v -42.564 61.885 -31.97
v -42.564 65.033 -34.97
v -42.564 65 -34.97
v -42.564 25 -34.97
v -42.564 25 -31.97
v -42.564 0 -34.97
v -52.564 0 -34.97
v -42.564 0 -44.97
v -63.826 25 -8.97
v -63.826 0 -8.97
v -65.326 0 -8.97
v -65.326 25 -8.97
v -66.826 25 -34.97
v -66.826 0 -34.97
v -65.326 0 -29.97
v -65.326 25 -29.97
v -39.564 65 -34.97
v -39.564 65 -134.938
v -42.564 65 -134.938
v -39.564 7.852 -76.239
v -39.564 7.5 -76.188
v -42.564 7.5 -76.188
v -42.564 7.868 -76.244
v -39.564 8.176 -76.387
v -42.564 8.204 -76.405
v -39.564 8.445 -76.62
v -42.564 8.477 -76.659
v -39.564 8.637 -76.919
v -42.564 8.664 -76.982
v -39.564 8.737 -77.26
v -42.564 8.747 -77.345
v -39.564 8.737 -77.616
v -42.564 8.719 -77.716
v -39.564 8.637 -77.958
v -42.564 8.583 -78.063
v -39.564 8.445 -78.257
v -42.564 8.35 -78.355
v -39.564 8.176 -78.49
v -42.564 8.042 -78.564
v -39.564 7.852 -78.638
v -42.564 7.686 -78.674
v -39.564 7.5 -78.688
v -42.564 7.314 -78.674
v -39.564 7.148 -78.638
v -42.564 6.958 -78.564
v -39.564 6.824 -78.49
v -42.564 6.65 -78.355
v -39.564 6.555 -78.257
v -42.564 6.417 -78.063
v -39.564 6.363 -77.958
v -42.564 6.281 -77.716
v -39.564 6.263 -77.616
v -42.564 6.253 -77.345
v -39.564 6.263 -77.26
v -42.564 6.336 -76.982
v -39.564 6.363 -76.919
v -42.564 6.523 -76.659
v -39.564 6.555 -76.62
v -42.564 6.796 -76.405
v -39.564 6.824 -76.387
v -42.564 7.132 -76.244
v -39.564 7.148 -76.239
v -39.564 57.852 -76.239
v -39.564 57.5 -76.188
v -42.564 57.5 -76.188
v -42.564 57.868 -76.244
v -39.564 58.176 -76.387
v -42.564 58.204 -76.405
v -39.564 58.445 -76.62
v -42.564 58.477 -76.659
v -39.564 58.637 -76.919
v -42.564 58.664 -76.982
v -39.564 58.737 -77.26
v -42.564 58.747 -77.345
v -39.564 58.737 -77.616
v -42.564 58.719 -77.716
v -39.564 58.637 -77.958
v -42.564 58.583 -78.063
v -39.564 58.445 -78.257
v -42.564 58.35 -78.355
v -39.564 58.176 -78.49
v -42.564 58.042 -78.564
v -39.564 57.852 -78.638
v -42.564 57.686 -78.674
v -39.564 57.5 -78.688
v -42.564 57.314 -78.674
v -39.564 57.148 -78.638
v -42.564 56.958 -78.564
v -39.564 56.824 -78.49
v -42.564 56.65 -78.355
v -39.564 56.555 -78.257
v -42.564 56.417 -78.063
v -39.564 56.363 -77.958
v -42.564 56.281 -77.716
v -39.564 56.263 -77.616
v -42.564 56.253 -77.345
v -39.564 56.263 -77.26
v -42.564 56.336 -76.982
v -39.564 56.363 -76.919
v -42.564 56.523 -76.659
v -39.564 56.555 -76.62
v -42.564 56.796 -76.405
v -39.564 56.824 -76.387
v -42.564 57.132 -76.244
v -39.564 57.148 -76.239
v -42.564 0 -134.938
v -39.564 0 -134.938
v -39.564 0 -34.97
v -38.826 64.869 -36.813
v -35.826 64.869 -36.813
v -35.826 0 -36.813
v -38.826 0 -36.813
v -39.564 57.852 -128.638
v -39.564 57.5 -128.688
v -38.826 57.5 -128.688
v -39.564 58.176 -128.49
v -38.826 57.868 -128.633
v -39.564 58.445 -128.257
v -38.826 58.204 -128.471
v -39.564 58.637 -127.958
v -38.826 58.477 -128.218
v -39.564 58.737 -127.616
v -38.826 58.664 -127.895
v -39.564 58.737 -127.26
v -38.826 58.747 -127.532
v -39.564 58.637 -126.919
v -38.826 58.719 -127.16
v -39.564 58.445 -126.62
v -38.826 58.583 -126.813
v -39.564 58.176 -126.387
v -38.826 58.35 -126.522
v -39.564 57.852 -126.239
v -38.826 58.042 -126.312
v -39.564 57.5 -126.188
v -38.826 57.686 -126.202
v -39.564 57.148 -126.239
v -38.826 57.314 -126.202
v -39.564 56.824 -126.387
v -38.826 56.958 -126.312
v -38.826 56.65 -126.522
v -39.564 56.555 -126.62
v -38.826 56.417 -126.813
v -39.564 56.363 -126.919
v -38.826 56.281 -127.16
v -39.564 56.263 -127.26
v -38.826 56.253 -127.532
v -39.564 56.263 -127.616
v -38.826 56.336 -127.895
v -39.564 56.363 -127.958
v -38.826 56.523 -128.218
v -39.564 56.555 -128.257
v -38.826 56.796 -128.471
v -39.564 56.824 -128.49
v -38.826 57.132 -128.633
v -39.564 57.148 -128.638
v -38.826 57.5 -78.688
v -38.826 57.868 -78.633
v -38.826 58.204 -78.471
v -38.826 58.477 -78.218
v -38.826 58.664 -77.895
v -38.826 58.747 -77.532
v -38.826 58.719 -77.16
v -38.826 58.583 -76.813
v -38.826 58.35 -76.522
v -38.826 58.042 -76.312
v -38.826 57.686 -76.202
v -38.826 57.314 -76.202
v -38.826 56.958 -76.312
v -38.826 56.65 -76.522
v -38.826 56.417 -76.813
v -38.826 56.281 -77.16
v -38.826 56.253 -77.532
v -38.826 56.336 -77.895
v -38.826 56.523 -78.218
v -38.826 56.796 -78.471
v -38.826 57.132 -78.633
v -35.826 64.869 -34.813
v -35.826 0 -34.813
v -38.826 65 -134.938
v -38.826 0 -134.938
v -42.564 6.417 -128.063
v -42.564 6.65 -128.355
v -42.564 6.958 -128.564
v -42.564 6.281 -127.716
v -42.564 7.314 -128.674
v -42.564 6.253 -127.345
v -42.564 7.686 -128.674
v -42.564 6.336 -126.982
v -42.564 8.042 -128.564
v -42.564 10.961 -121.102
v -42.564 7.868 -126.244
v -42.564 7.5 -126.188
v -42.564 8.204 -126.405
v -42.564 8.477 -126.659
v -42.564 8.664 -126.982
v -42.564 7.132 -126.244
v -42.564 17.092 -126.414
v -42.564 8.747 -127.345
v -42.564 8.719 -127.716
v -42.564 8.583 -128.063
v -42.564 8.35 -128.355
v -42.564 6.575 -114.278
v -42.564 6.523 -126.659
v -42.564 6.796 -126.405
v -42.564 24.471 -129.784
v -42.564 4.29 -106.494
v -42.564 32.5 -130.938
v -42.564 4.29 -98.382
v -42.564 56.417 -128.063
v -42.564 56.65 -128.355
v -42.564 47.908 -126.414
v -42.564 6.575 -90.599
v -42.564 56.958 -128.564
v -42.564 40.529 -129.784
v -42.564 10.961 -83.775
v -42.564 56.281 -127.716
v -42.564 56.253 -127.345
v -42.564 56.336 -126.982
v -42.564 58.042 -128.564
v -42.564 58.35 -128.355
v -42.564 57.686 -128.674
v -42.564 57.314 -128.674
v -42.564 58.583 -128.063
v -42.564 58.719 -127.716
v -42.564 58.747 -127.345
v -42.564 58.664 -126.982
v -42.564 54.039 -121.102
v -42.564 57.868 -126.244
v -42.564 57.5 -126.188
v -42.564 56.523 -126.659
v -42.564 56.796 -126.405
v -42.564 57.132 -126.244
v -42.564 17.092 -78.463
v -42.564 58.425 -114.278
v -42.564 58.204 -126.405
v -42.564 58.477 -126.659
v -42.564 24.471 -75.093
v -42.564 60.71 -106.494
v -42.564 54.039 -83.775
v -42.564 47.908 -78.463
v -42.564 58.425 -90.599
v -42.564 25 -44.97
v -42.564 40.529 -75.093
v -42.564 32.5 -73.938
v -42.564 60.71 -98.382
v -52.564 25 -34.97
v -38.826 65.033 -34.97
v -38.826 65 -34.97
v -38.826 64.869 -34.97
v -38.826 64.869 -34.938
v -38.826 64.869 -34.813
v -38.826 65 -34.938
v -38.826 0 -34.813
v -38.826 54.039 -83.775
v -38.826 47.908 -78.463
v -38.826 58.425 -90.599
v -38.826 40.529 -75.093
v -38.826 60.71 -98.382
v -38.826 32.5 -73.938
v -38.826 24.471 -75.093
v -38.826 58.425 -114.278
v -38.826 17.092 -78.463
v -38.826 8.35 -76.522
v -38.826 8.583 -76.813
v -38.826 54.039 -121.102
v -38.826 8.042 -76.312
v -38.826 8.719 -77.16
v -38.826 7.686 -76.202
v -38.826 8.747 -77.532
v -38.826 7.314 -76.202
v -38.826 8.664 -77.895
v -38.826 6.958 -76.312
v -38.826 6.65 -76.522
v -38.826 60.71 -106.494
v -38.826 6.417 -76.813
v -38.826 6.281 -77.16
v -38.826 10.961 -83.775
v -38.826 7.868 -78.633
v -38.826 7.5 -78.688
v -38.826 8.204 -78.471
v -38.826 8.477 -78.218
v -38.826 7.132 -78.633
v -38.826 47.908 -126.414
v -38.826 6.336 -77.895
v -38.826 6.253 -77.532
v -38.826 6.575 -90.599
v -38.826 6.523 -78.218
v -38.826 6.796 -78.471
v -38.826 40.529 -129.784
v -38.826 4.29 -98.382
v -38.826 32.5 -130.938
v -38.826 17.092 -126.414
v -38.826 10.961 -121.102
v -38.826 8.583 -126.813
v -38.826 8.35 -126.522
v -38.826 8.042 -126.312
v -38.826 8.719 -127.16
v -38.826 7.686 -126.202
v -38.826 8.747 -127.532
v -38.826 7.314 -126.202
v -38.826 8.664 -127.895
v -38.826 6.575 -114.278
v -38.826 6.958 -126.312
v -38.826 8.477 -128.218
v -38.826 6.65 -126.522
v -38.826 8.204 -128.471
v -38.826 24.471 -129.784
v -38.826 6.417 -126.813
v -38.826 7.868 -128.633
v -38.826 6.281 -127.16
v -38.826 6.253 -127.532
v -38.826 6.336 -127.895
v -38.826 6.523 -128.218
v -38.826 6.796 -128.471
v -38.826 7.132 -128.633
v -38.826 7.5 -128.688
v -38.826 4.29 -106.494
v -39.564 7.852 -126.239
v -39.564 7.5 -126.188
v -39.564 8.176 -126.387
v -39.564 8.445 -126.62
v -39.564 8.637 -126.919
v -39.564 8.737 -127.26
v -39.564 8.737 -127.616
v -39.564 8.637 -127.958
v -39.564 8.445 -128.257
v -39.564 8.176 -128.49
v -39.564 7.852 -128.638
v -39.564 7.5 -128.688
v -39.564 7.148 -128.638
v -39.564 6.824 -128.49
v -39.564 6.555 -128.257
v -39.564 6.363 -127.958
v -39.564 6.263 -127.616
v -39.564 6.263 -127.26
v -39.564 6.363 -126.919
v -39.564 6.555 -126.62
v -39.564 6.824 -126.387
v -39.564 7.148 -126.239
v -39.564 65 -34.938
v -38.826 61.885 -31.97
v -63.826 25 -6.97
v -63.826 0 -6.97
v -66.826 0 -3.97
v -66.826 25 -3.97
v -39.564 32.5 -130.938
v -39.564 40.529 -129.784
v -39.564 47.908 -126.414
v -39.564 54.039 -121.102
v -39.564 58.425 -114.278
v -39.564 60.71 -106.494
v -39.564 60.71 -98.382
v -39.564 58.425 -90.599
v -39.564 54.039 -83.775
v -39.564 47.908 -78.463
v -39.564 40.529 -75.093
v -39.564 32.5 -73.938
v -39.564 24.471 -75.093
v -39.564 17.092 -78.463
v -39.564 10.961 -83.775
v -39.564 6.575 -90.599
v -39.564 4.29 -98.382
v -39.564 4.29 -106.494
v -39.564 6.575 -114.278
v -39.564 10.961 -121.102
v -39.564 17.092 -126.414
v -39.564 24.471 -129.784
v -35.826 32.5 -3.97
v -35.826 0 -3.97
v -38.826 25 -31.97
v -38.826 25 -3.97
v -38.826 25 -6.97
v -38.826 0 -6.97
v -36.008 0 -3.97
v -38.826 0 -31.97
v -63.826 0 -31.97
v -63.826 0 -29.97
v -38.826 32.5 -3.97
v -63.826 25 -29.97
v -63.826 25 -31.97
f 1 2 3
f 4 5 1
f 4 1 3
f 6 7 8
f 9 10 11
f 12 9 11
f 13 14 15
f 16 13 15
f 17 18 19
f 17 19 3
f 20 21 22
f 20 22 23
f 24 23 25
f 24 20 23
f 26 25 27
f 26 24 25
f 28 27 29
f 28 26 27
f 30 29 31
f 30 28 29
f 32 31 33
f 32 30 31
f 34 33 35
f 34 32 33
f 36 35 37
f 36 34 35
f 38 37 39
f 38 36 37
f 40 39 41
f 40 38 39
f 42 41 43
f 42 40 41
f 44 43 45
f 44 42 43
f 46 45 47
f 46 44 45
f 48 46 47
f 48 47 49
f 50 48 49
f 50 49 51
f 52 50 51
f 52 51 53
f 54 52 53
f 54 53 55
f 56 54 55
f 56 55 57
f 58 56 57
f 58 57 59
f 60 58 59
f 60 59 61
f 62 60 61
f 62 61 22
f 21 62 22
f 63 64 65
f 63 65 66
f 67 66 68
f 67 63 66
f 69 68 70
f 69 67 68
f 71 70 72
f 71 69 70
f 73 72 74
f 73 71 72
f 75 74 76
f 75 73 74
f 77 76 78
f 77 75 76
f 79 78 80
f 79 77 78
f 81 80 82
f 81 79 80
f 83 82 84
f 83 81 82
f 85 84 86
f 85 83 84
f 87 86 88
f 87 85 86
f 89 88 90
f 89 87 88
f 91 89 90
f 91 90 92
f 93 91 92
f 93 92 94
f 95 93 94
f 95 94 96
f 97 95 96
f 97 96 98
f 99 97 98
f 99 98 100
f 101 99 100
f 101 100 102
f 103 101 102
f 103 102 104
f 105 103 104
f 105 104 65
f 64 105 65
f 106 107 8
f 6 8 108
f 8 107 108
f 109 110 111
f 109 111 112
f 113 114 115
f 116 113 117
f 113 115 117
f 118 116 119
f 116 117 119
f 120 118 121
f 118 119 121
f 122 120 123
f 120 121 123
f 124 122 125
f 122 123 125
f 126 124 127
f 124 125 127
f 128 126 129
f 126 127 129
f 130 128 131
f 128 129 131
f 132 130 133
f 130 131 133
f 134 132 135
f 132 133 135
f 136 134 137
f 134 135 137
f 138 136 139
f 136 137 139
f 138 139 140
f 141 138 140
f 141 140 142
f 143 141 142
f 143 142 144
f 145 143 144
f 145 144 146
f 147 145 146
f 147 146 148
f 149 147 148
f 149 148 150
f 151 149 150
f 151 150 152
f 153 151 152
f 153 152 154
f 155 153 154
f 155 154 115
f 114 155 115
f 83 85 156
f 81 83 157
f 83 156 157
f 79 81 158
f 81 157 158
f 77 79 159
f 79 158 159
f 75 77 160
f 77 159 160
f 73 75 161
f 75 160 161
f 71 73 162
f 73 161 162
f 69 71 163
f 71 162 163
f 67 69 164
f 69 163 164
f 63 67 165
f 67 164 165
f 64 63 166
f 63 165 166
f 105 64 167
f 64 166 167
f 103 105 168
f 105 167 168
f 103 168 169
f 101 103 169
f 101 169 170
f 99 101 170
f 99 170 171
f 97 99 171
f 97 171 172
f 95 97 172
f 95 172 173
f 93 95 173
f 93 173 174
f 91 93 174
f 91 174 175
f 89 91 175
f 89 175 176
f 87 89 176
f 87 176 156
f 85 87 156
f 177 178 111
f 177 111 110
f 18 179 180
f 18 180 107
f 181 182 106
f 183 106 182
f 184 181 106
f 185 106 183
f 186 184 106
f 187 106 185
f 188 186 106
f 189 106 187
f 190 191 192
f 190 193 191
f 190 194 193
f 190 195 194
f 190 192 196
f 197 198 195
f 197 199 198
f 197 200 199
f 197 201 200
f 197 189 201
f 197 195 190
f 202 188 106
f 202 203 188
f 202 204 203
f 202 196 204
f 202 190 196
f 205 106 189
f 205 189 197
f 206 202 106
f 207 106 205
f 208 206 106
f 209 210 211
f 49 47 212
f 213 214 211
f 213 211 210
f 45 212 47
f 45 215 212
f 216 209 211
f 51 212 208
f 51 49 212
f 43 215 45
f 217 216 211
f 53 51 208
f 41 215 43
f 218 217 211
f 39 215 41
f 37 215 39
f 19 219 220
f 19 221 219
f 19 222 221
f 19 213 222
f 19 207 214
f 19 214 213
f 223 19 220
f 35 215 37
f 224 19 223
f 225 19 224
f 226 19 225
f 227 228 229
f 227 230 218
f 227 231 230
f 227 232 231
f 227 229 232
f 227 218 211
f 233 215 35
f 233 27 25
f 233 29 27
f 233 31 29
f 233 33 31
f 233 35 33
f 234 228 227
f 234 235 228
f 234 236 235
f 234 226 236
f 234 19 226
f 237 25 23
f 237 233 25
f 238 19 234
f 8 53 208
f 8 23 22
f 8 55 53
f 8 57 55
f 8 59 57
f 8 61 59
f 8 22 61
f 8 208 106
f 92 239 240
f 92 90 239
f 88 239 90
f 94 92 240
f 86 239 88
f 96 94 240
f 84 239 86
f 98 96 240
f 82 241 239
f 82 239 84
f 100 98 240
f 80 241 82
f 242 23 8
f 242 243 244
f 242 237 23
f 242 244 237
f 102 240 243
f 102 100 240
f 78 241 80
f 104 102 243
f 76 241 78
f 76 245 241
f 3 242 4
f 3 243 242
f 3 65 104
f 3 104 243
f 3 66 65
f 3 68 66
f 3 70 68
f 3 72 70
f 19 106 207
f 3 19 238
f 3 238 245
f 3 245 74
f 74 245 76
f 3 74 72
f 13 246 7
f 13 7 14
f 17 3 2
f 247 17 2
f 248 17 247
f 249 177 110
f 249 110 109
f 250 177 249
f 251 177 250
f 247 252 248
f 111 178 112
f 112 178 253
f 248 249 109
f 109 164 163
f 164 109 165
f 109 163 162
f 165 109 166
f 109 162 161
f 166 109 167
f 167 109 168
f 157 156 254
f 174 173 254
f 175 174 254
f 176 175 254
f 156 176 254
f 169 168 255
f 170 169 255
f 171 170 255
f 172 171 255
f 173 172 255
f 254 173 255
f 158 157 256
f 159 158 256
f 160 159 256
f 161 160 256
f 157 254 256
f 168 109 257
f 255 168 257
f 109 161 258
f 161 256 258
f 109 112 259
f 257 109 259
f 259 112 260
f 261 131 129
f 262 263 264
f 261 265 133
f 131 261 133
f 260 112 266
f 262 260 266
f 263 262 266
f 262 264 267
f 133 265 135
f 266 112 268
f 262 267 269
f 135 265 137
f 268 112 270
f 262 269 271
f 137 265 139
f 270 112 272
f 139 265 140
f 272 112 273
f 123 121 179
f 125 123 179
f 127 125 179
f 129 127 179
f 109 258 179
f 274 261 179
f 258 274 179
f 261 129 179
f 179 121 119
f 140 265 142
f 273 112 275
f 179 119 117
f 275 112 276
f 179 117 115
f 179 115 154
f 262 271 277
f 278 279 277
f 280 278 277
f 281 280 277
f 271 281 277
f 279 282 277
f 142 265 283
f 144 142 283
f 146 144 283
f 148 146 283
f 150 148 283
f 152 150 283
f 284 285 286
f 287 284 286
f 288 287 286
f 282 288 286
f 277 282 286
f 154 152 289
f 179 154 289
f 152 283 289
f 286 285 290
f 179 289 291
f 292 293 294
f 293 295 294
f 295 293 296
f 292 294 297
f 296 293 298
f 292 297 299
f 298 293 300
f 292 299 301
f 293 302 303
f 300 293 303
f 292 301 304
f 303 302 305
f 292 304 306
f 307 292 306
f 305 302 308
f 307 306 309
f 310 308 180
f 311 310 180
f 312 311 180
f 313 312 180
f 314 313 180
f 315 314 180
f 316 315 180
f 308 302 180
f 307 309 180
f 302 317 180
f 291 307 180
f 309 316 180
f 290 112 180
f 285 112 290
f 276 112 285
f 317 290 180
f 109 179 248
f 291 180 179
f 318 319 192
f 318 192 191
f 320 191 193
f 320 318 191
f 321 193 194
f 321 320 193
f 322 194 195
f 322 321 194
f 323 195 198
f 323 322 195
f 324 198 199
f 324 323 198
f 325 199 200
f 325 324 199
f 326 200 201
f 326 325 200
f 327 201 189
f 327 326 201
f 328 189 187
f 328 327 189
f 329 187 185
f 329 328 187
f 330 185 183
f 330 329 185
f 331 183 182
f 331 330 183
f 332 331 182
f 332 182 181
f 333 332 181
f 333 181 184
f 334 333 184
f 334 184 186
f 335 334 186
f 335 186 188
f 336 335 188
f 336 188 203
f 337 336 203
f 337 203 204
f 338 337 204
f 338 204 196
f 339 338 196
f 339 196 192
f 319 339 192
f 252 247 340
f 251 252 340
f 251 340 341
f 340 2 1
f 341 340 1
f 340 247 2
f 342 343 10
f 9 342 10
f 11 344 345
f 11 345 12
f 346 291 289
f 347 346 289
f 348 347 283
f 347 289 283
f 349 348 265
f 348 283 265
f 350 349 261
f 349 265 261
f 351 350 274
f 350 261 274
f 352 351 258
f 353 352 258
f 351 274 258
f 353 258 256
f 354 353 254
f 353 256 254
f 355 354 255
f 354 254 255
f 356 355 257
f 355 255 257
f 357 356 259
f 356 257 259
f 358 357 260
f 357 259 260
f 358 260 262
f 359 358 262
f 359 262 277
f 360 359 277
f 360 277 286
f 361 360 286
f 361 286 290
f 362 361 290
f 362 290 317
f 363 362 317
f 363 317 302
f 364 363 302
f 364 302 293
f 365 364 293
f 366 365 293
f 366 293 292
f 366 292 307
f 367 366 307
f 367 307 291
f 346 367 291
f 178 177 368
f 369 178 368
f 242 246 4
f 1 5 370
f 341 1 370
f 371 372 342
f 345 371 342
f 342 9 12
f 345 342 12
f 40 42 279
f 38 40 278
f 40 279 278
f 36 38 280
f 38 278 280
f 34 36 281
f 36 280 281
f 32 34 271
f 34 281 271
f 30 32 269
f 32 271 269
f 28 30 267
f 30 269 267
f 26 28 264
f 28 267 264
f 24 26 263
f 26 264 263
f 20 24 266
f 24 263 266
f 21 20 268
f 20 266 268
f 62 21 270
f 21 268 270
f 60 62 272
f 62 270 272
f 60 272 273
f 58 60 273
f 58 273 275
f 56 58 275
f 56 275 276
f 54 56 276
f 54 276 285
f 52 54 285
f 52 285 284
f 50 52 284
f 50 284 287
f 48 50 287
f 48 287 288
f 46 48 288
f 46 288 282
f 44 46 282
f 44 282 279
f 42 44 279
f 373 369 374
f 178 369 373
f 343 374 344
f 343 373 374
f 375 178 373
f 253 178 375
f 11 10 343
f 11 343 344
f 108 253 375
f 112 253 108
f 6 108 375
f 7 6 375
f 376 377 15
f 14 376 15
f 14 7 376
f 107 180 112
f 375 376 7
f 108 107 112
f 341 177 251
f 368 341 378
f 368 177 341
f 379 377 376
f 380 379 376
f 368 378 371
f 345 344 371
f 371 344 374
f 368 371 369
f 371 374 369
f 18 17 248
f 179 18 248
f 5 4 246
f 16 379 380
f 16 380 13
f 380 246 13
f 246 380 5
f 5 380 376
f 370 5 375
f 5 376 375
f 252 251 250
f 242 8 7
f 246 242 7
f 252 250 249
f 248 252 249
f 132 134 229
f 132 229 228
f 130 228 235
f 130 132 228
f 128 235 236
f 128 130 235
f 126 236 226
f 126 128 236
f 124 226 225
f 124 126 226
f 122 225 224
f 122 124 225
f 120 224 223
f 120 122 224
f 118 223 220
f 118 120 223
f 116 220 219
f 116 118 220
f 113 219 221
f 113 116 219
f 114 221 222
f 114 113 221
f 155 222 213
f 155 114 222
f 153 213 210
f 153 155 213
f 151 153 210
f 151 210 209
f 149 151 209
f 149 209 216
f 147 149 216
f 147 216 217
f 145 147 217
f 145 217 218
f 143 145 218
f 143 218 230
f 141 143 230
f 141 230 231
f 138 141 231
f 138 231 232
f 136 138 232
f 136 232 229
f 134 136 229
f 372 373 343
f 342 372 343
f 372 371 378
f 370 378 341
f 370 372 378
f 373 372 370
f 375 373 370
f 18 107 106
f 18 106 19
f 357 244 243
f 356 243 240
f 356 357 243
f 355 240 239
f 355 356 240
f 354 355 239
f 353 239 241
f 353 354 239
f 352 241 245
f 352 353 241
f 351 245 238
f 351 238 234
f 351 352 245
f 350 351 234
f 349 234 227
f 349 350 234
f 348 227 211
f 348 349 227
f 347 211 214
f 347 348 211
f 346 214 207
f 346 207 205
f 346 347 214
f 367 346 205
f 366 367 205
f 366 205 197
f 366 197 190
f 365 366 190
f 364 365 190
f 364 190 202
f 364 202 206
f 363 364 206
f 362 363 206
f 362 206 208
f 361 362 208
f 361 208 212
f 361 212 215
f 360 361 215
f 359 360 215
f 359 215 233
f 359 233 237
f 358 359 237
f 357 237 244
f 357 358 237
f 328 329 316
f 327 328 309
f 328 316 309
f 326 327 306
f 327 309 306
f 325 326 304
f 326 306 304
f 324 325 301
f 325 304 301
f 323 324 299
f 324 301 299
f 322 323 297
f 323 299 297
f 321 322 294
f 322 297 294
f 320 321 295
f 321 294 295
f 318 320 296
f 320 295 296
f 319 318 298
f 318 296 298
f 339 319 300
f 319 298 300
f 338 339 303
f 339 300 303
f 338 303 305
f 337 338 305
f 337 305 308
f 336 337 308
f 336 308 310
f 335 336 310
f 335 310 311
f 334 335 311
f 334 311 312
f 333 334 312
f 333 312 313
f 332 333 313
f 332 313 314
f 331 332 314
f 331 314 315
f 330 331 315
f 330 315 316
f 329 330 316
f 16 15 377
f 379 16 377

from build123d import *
from build123d.topology import SkipClean

# Parameters (mm, degrees)
EXTRUDE_1_DEPTH      = 25
CUT_EXTRUDE_4_DEPTH  = 80.457942189
SKETCH_7_W           = 16.60831278
SKETCH_7_H           = 38.473598513
CUT_EXTRUDE_14_DEPTH = 80.457942189
SKETCH_8_W           = 5
SKETCH_8_H           = 30.968526609
EXTRUDE_2_DEPTH      = 25
SKETCH_9_W           = 2.765387297
SKETCH_9_H           = 65
EXTRUDE_3_DEPTH      = 100
SKETCH_10_W          = 5.026813651
SKETCH_10_H          = 30.968526609
EXTRUDE_4_DEPTH      = 40
CUT_EXTRUDE_15_DEPTH = 100
SKETCH_12_R          = 28.5
CUT_EXTRUDE_16_DEPTH = 100
SKETCH_13_R          = 1.25
CUT_EXTRUDE_17_DEPTH = 100
SKETCH_14_W          = 5.026813651
SKETCH_14_H          = 100.124810737
CUT_EXTRUDE_19_DEPTH = 165.009199789
SKETCH_15_W          = 2.026813651
SKETCH_15_H          = 30.843715872
CUT_EXTRUDE_20_DEPTH = 165.009199789
SKETCH_16_W          = 99.968526609
SKETCH_16_H          = 65
SKETCH_16_R          = 28.5
SKETCH_16_R_2        = 1.25
EXTRUDE_5_DEPTH      = 3
EXTRUDE_7_REACH      = 157.801
SKETCH_17_W          = 3.738573646
SKETCH_17_H          = 3
CHAMFER_1_DEPTH      = 25
SKETCH_18_W          = 3
SKETCH_18_H          = 64.869017051
EXTRUDE_8_DEPTH      = 2


with BuildPart() as part:
    # Эскиз1 → Бобышка-Вытянуть1 (new body)
    with BuildSketch(Plane(origin=(0, 0, 0), x_dir=(1, 0, 0), z_dir=(0, 1, 0))):
        Polygon((-66.825757576, 34.969739794), (-66.825757576, 29.969739794), (-63.825757576, 29.969739794), (-63.825757576, 31.969739794), (-38.825757576, 31.969739794), (-38.825757576, 6.969739794), (-63.825757576, 6.969739794), (-63.825757576, 8.969739794), (-66.825757576, 8.969739794), (-66.825757576, 3.969739794), (-22.123470102, 3.969739794), (-36.579007505, 34.969739794), align=None)
    extrude(amount=EXTRUDE_1_DEPTH)

    # Эскиз3 → Вырез-Вытянуть4 (cut, through all)
    with BuildSketch(Plane.XZ):
        Polygon((-66.825757576, -3.969739794), (-65.325757576, -8.969739794), (-66.825757576, -8.969739794), align=None)
        Polygon((-66.825757576, -29.969739794), (-66.825757576, -34.969739794), (-65.325757576, -29.969739794), align=None)
    extrude(amount=-CUT_EXTRUDE_4_DEPTH, mode=Mode.SUBTRACT)

    # Эскиз7 → Вырез-Вытянуть14 (cut, through all)
    with BuildSketch(Plane(origin=(0, 0, 0), x_dir=(-1, 0, 0), z_dir=(0, -1, 0))):
        with Locations((27.703474463, 20.539743139)):
            Rectangle(SKETCH_7_W, SKETCH_7_H)
    extrude(amount=-CUT_EXTRUDE_14_DEPTH, mode=Mode.SUBTRACT)

    # Эскиз8 → Бобышка-Вытянуть2 (add)
    with BuildSketch(Plane(origin=(0, 0, 0), x_dir=(-1, 0, 0), z_dir=(0, -1, 0))):
        with Locations((36.298943925, 19.454003098)):
            Rectangle(SKETCH_8_W, SKETCH_8_H)
    extrude(amount=-EXTRUDE_2_DEPTH)

    # Эскиз9 → Бобышка-Вытянуть3 (add)
    with BuildSketch(Plane(origin=(0, 0, -34.938266403), x_dir=(-1, 0, 0), z_dir=(0, 0, -1))):
        with Locations((38.181637573, 32.5)):
            Rectangle(SKETCH_9_W, SKETCH_9_H)
    extrude(amount=EXTRUDE_3_DEPTH)

    # Эскиз10 → Бобышка-Вытянуть4 (add)
    with BuildSketch(Plane(origin=(0, 25, 0), x_dir=(1, 0, 0), z_dir=(0, 1, 0))):
        with Locations((-36.312350751, 19.454003098)):
            Rectangle(SKETCH_10_W, SKETCH_10_H)
    extrude(amount=EXTRUDE_4_DEPTH)

    # Эскиз11 → Вырез-Вытянуть15 (cut)
    with BuildSketch(Plane(origin=(-33.798943925, 0, 0), x_dir=(0, 0, -1), z_dir=(1, 0, 0))):
        Polygon((34.938266403, 65), (3.969739794, 32.5), (3.969739794, 65), align=None)
    extrude(amount=-CUT_EXTRUDE_15_DEPTH, mode=Mode.SUBTRACT)

    # Эскиз12 → Вырез-Вытянуть16 (cut)
    with BuildSketch(Plane(origin=(-36.798943925, 0, 0), x_dir=(0, 0, -1), z_dir=(1, 0, 0))):
        with Locations((102.438266403, 32.5)):
            Circle(SKETCH_12_R)
    extrude(amount=-CUT_EXTRUDE_16_DEPTH, mode=Mode.SUBTRACT)

    # Эскиз13 → Вырез-Вытянуть17 (cut)
    with BuildSketch(Plane(origin=(-36.798943925, 0, 0), x_dir=(0, 0, -1), z_dir=(1, 0, 0))):
        with Locations((77.438266403, 57.5)):
            Circle(SKETCH_13_R)
        with Locations((127.438266403, 57.5)):
            Circle(SKETCH_13_R)
        with Locations((127.438266403, 7.5)):
            Circle(SKETCH_13_R)
        with Locations((77.438266403, 7.5)):
            Circle(SKETCH_13_R)
    extrude(amount=-CUT_EXTRUDE_17_DEPTH, mode=Mode.SUBTRACT)

    # Эскиз14 → Вырез-Вытянуть19 (cut, through all)
    with BuildSketch(Plane(origin=(0, 0, 0), x_dir=(-1, 0, 0), z_dir=(0, -1, 0))):
        with Locations((36.312350751, 84.875861035)):
            Rectangle(SKETCH_14_W, SKETCH_14_H)
    extrude(amount=-CUT_EXTRUDE_19_DEPTH, mode=Mode.SUBTRACT)

    # Эскиз15 → Вырез-Вытянуть20 (cut, through all)
    with BuildSketch(Plane.XZ):
        with Locations((-34.812350751, -19.39159773)):
            Rectangle(SKETCH_15_W, SKETCH_15_H)
    extrude(amount=-CUT_EXTRUDE_20_DEPTH, mode=Mode.SUBTRACT)

    # Эскиз16 → Бобышка-Вытянуть5 (add)
    with SkipClean():  # the faces are left unmerged after this step: merging them gives an invalid solid
        with BuildSketch(Plane.ZY.offset(39.564331222)):
            with Locations((-84.954003098, 32.5)):
                Rectangle(SKETCH_16_W, SKETCH_16_H)
            with Locations((-102.438266403, 32.5)):
                Circle(SKETCH_16_R, mode=Mode.SUBTRACT)
            with Locations((-127.438266403, 57.5)):
                Circle(SKETCH_16_R_2, mode=Mode.SUBTRACT)
            with Locations((-77.438266403, 57.5)):
                Circle(SKETCH_16_R_2, mode=Mode.SUBTRACT)
            with Locations((-77.438266403, 7.5)):
                Circle(SKETCH_16_R_2, mode=Mode.SUBTRACT)
            with Locations((-127.438266403, 7.5)):
                Circle(SKETCH_16_R_2, mode=Mode.SUBTRACT)
        extrude(amount=EXTRUDE_5_DEPTH)

    # Бобышка-Вытянуть7: up to this plane
    with SkipClean():  # the faces are left unmerged after this step: merging them gives an invalid solid
        extrude_7_end = Plane(origin=(-133.798943925, 65, -34.938266403), z_dir=(0, -0.6898437432956686, -0.7239582928842101))
        # Эскиз17 → Бобышка-Вытянуть7 (add, up to the surface)
        with BuildSketch(Plane(origin=(0, 25, 0), x_dir=(1, 0, 0), z_dir=(0, 1, 0)), mode=Mode.PRIVATE) as extrude_7_sk1:
            with Locations((-40.695044399, 33.469739794)):
                Rectangle(SKETCH_17_W, SKETCH_17_H)
        extrude_7_tool1 = split(extrude(extrude_7_sk1.sketch, amount=EXTRUDE_7_REACH, mode=Mode.PRIVATE), bisect_by=extrude_7_end, keep=Keep.BOTH, mode=Mode.PRIVATE)
        add(extrude_7_tool1.solids().sort_by_distance((-40.695044, 25, -33.46974))[0])

    # Фаска1: read off the stored shape, not the designer's step
    # Фаска1 outline → Фаска1 (add)
    with SkipClean():  # the faces are left unmerged after this step: merging them gives an invalid solid
        with BuildSketch(Plane(origin=(0, 0, 0), x_dir=(1, 0, 0), z_dir=(0, 1, 0))):
            Polygon((-42.564331222, 44.969739794), (-52.564331222, 34.969739794), (-42.564331222, 34.969739794), align=None)
        extrude(amount=CHAMFER_1_DEPTH)

    # Эскиз18 → Бобышка-Вытянуть8 (add)
    with SkipClean():  # the faces are left unmerged after this step: merging them gives an invalid solid
        with BuildSketch(Plane(origin=(0, 0, -34.813455666), x_dir=(-1, 0, 0), z_dir=(0, 0, -1))):
            with Locations((37.325757576, 32.434508526)):
                Rectangle(SKETCH_18_W, SKETCH_18_H)
        extrude(amount=EXTRUDE_8_DEPTH)


solid = part.part
